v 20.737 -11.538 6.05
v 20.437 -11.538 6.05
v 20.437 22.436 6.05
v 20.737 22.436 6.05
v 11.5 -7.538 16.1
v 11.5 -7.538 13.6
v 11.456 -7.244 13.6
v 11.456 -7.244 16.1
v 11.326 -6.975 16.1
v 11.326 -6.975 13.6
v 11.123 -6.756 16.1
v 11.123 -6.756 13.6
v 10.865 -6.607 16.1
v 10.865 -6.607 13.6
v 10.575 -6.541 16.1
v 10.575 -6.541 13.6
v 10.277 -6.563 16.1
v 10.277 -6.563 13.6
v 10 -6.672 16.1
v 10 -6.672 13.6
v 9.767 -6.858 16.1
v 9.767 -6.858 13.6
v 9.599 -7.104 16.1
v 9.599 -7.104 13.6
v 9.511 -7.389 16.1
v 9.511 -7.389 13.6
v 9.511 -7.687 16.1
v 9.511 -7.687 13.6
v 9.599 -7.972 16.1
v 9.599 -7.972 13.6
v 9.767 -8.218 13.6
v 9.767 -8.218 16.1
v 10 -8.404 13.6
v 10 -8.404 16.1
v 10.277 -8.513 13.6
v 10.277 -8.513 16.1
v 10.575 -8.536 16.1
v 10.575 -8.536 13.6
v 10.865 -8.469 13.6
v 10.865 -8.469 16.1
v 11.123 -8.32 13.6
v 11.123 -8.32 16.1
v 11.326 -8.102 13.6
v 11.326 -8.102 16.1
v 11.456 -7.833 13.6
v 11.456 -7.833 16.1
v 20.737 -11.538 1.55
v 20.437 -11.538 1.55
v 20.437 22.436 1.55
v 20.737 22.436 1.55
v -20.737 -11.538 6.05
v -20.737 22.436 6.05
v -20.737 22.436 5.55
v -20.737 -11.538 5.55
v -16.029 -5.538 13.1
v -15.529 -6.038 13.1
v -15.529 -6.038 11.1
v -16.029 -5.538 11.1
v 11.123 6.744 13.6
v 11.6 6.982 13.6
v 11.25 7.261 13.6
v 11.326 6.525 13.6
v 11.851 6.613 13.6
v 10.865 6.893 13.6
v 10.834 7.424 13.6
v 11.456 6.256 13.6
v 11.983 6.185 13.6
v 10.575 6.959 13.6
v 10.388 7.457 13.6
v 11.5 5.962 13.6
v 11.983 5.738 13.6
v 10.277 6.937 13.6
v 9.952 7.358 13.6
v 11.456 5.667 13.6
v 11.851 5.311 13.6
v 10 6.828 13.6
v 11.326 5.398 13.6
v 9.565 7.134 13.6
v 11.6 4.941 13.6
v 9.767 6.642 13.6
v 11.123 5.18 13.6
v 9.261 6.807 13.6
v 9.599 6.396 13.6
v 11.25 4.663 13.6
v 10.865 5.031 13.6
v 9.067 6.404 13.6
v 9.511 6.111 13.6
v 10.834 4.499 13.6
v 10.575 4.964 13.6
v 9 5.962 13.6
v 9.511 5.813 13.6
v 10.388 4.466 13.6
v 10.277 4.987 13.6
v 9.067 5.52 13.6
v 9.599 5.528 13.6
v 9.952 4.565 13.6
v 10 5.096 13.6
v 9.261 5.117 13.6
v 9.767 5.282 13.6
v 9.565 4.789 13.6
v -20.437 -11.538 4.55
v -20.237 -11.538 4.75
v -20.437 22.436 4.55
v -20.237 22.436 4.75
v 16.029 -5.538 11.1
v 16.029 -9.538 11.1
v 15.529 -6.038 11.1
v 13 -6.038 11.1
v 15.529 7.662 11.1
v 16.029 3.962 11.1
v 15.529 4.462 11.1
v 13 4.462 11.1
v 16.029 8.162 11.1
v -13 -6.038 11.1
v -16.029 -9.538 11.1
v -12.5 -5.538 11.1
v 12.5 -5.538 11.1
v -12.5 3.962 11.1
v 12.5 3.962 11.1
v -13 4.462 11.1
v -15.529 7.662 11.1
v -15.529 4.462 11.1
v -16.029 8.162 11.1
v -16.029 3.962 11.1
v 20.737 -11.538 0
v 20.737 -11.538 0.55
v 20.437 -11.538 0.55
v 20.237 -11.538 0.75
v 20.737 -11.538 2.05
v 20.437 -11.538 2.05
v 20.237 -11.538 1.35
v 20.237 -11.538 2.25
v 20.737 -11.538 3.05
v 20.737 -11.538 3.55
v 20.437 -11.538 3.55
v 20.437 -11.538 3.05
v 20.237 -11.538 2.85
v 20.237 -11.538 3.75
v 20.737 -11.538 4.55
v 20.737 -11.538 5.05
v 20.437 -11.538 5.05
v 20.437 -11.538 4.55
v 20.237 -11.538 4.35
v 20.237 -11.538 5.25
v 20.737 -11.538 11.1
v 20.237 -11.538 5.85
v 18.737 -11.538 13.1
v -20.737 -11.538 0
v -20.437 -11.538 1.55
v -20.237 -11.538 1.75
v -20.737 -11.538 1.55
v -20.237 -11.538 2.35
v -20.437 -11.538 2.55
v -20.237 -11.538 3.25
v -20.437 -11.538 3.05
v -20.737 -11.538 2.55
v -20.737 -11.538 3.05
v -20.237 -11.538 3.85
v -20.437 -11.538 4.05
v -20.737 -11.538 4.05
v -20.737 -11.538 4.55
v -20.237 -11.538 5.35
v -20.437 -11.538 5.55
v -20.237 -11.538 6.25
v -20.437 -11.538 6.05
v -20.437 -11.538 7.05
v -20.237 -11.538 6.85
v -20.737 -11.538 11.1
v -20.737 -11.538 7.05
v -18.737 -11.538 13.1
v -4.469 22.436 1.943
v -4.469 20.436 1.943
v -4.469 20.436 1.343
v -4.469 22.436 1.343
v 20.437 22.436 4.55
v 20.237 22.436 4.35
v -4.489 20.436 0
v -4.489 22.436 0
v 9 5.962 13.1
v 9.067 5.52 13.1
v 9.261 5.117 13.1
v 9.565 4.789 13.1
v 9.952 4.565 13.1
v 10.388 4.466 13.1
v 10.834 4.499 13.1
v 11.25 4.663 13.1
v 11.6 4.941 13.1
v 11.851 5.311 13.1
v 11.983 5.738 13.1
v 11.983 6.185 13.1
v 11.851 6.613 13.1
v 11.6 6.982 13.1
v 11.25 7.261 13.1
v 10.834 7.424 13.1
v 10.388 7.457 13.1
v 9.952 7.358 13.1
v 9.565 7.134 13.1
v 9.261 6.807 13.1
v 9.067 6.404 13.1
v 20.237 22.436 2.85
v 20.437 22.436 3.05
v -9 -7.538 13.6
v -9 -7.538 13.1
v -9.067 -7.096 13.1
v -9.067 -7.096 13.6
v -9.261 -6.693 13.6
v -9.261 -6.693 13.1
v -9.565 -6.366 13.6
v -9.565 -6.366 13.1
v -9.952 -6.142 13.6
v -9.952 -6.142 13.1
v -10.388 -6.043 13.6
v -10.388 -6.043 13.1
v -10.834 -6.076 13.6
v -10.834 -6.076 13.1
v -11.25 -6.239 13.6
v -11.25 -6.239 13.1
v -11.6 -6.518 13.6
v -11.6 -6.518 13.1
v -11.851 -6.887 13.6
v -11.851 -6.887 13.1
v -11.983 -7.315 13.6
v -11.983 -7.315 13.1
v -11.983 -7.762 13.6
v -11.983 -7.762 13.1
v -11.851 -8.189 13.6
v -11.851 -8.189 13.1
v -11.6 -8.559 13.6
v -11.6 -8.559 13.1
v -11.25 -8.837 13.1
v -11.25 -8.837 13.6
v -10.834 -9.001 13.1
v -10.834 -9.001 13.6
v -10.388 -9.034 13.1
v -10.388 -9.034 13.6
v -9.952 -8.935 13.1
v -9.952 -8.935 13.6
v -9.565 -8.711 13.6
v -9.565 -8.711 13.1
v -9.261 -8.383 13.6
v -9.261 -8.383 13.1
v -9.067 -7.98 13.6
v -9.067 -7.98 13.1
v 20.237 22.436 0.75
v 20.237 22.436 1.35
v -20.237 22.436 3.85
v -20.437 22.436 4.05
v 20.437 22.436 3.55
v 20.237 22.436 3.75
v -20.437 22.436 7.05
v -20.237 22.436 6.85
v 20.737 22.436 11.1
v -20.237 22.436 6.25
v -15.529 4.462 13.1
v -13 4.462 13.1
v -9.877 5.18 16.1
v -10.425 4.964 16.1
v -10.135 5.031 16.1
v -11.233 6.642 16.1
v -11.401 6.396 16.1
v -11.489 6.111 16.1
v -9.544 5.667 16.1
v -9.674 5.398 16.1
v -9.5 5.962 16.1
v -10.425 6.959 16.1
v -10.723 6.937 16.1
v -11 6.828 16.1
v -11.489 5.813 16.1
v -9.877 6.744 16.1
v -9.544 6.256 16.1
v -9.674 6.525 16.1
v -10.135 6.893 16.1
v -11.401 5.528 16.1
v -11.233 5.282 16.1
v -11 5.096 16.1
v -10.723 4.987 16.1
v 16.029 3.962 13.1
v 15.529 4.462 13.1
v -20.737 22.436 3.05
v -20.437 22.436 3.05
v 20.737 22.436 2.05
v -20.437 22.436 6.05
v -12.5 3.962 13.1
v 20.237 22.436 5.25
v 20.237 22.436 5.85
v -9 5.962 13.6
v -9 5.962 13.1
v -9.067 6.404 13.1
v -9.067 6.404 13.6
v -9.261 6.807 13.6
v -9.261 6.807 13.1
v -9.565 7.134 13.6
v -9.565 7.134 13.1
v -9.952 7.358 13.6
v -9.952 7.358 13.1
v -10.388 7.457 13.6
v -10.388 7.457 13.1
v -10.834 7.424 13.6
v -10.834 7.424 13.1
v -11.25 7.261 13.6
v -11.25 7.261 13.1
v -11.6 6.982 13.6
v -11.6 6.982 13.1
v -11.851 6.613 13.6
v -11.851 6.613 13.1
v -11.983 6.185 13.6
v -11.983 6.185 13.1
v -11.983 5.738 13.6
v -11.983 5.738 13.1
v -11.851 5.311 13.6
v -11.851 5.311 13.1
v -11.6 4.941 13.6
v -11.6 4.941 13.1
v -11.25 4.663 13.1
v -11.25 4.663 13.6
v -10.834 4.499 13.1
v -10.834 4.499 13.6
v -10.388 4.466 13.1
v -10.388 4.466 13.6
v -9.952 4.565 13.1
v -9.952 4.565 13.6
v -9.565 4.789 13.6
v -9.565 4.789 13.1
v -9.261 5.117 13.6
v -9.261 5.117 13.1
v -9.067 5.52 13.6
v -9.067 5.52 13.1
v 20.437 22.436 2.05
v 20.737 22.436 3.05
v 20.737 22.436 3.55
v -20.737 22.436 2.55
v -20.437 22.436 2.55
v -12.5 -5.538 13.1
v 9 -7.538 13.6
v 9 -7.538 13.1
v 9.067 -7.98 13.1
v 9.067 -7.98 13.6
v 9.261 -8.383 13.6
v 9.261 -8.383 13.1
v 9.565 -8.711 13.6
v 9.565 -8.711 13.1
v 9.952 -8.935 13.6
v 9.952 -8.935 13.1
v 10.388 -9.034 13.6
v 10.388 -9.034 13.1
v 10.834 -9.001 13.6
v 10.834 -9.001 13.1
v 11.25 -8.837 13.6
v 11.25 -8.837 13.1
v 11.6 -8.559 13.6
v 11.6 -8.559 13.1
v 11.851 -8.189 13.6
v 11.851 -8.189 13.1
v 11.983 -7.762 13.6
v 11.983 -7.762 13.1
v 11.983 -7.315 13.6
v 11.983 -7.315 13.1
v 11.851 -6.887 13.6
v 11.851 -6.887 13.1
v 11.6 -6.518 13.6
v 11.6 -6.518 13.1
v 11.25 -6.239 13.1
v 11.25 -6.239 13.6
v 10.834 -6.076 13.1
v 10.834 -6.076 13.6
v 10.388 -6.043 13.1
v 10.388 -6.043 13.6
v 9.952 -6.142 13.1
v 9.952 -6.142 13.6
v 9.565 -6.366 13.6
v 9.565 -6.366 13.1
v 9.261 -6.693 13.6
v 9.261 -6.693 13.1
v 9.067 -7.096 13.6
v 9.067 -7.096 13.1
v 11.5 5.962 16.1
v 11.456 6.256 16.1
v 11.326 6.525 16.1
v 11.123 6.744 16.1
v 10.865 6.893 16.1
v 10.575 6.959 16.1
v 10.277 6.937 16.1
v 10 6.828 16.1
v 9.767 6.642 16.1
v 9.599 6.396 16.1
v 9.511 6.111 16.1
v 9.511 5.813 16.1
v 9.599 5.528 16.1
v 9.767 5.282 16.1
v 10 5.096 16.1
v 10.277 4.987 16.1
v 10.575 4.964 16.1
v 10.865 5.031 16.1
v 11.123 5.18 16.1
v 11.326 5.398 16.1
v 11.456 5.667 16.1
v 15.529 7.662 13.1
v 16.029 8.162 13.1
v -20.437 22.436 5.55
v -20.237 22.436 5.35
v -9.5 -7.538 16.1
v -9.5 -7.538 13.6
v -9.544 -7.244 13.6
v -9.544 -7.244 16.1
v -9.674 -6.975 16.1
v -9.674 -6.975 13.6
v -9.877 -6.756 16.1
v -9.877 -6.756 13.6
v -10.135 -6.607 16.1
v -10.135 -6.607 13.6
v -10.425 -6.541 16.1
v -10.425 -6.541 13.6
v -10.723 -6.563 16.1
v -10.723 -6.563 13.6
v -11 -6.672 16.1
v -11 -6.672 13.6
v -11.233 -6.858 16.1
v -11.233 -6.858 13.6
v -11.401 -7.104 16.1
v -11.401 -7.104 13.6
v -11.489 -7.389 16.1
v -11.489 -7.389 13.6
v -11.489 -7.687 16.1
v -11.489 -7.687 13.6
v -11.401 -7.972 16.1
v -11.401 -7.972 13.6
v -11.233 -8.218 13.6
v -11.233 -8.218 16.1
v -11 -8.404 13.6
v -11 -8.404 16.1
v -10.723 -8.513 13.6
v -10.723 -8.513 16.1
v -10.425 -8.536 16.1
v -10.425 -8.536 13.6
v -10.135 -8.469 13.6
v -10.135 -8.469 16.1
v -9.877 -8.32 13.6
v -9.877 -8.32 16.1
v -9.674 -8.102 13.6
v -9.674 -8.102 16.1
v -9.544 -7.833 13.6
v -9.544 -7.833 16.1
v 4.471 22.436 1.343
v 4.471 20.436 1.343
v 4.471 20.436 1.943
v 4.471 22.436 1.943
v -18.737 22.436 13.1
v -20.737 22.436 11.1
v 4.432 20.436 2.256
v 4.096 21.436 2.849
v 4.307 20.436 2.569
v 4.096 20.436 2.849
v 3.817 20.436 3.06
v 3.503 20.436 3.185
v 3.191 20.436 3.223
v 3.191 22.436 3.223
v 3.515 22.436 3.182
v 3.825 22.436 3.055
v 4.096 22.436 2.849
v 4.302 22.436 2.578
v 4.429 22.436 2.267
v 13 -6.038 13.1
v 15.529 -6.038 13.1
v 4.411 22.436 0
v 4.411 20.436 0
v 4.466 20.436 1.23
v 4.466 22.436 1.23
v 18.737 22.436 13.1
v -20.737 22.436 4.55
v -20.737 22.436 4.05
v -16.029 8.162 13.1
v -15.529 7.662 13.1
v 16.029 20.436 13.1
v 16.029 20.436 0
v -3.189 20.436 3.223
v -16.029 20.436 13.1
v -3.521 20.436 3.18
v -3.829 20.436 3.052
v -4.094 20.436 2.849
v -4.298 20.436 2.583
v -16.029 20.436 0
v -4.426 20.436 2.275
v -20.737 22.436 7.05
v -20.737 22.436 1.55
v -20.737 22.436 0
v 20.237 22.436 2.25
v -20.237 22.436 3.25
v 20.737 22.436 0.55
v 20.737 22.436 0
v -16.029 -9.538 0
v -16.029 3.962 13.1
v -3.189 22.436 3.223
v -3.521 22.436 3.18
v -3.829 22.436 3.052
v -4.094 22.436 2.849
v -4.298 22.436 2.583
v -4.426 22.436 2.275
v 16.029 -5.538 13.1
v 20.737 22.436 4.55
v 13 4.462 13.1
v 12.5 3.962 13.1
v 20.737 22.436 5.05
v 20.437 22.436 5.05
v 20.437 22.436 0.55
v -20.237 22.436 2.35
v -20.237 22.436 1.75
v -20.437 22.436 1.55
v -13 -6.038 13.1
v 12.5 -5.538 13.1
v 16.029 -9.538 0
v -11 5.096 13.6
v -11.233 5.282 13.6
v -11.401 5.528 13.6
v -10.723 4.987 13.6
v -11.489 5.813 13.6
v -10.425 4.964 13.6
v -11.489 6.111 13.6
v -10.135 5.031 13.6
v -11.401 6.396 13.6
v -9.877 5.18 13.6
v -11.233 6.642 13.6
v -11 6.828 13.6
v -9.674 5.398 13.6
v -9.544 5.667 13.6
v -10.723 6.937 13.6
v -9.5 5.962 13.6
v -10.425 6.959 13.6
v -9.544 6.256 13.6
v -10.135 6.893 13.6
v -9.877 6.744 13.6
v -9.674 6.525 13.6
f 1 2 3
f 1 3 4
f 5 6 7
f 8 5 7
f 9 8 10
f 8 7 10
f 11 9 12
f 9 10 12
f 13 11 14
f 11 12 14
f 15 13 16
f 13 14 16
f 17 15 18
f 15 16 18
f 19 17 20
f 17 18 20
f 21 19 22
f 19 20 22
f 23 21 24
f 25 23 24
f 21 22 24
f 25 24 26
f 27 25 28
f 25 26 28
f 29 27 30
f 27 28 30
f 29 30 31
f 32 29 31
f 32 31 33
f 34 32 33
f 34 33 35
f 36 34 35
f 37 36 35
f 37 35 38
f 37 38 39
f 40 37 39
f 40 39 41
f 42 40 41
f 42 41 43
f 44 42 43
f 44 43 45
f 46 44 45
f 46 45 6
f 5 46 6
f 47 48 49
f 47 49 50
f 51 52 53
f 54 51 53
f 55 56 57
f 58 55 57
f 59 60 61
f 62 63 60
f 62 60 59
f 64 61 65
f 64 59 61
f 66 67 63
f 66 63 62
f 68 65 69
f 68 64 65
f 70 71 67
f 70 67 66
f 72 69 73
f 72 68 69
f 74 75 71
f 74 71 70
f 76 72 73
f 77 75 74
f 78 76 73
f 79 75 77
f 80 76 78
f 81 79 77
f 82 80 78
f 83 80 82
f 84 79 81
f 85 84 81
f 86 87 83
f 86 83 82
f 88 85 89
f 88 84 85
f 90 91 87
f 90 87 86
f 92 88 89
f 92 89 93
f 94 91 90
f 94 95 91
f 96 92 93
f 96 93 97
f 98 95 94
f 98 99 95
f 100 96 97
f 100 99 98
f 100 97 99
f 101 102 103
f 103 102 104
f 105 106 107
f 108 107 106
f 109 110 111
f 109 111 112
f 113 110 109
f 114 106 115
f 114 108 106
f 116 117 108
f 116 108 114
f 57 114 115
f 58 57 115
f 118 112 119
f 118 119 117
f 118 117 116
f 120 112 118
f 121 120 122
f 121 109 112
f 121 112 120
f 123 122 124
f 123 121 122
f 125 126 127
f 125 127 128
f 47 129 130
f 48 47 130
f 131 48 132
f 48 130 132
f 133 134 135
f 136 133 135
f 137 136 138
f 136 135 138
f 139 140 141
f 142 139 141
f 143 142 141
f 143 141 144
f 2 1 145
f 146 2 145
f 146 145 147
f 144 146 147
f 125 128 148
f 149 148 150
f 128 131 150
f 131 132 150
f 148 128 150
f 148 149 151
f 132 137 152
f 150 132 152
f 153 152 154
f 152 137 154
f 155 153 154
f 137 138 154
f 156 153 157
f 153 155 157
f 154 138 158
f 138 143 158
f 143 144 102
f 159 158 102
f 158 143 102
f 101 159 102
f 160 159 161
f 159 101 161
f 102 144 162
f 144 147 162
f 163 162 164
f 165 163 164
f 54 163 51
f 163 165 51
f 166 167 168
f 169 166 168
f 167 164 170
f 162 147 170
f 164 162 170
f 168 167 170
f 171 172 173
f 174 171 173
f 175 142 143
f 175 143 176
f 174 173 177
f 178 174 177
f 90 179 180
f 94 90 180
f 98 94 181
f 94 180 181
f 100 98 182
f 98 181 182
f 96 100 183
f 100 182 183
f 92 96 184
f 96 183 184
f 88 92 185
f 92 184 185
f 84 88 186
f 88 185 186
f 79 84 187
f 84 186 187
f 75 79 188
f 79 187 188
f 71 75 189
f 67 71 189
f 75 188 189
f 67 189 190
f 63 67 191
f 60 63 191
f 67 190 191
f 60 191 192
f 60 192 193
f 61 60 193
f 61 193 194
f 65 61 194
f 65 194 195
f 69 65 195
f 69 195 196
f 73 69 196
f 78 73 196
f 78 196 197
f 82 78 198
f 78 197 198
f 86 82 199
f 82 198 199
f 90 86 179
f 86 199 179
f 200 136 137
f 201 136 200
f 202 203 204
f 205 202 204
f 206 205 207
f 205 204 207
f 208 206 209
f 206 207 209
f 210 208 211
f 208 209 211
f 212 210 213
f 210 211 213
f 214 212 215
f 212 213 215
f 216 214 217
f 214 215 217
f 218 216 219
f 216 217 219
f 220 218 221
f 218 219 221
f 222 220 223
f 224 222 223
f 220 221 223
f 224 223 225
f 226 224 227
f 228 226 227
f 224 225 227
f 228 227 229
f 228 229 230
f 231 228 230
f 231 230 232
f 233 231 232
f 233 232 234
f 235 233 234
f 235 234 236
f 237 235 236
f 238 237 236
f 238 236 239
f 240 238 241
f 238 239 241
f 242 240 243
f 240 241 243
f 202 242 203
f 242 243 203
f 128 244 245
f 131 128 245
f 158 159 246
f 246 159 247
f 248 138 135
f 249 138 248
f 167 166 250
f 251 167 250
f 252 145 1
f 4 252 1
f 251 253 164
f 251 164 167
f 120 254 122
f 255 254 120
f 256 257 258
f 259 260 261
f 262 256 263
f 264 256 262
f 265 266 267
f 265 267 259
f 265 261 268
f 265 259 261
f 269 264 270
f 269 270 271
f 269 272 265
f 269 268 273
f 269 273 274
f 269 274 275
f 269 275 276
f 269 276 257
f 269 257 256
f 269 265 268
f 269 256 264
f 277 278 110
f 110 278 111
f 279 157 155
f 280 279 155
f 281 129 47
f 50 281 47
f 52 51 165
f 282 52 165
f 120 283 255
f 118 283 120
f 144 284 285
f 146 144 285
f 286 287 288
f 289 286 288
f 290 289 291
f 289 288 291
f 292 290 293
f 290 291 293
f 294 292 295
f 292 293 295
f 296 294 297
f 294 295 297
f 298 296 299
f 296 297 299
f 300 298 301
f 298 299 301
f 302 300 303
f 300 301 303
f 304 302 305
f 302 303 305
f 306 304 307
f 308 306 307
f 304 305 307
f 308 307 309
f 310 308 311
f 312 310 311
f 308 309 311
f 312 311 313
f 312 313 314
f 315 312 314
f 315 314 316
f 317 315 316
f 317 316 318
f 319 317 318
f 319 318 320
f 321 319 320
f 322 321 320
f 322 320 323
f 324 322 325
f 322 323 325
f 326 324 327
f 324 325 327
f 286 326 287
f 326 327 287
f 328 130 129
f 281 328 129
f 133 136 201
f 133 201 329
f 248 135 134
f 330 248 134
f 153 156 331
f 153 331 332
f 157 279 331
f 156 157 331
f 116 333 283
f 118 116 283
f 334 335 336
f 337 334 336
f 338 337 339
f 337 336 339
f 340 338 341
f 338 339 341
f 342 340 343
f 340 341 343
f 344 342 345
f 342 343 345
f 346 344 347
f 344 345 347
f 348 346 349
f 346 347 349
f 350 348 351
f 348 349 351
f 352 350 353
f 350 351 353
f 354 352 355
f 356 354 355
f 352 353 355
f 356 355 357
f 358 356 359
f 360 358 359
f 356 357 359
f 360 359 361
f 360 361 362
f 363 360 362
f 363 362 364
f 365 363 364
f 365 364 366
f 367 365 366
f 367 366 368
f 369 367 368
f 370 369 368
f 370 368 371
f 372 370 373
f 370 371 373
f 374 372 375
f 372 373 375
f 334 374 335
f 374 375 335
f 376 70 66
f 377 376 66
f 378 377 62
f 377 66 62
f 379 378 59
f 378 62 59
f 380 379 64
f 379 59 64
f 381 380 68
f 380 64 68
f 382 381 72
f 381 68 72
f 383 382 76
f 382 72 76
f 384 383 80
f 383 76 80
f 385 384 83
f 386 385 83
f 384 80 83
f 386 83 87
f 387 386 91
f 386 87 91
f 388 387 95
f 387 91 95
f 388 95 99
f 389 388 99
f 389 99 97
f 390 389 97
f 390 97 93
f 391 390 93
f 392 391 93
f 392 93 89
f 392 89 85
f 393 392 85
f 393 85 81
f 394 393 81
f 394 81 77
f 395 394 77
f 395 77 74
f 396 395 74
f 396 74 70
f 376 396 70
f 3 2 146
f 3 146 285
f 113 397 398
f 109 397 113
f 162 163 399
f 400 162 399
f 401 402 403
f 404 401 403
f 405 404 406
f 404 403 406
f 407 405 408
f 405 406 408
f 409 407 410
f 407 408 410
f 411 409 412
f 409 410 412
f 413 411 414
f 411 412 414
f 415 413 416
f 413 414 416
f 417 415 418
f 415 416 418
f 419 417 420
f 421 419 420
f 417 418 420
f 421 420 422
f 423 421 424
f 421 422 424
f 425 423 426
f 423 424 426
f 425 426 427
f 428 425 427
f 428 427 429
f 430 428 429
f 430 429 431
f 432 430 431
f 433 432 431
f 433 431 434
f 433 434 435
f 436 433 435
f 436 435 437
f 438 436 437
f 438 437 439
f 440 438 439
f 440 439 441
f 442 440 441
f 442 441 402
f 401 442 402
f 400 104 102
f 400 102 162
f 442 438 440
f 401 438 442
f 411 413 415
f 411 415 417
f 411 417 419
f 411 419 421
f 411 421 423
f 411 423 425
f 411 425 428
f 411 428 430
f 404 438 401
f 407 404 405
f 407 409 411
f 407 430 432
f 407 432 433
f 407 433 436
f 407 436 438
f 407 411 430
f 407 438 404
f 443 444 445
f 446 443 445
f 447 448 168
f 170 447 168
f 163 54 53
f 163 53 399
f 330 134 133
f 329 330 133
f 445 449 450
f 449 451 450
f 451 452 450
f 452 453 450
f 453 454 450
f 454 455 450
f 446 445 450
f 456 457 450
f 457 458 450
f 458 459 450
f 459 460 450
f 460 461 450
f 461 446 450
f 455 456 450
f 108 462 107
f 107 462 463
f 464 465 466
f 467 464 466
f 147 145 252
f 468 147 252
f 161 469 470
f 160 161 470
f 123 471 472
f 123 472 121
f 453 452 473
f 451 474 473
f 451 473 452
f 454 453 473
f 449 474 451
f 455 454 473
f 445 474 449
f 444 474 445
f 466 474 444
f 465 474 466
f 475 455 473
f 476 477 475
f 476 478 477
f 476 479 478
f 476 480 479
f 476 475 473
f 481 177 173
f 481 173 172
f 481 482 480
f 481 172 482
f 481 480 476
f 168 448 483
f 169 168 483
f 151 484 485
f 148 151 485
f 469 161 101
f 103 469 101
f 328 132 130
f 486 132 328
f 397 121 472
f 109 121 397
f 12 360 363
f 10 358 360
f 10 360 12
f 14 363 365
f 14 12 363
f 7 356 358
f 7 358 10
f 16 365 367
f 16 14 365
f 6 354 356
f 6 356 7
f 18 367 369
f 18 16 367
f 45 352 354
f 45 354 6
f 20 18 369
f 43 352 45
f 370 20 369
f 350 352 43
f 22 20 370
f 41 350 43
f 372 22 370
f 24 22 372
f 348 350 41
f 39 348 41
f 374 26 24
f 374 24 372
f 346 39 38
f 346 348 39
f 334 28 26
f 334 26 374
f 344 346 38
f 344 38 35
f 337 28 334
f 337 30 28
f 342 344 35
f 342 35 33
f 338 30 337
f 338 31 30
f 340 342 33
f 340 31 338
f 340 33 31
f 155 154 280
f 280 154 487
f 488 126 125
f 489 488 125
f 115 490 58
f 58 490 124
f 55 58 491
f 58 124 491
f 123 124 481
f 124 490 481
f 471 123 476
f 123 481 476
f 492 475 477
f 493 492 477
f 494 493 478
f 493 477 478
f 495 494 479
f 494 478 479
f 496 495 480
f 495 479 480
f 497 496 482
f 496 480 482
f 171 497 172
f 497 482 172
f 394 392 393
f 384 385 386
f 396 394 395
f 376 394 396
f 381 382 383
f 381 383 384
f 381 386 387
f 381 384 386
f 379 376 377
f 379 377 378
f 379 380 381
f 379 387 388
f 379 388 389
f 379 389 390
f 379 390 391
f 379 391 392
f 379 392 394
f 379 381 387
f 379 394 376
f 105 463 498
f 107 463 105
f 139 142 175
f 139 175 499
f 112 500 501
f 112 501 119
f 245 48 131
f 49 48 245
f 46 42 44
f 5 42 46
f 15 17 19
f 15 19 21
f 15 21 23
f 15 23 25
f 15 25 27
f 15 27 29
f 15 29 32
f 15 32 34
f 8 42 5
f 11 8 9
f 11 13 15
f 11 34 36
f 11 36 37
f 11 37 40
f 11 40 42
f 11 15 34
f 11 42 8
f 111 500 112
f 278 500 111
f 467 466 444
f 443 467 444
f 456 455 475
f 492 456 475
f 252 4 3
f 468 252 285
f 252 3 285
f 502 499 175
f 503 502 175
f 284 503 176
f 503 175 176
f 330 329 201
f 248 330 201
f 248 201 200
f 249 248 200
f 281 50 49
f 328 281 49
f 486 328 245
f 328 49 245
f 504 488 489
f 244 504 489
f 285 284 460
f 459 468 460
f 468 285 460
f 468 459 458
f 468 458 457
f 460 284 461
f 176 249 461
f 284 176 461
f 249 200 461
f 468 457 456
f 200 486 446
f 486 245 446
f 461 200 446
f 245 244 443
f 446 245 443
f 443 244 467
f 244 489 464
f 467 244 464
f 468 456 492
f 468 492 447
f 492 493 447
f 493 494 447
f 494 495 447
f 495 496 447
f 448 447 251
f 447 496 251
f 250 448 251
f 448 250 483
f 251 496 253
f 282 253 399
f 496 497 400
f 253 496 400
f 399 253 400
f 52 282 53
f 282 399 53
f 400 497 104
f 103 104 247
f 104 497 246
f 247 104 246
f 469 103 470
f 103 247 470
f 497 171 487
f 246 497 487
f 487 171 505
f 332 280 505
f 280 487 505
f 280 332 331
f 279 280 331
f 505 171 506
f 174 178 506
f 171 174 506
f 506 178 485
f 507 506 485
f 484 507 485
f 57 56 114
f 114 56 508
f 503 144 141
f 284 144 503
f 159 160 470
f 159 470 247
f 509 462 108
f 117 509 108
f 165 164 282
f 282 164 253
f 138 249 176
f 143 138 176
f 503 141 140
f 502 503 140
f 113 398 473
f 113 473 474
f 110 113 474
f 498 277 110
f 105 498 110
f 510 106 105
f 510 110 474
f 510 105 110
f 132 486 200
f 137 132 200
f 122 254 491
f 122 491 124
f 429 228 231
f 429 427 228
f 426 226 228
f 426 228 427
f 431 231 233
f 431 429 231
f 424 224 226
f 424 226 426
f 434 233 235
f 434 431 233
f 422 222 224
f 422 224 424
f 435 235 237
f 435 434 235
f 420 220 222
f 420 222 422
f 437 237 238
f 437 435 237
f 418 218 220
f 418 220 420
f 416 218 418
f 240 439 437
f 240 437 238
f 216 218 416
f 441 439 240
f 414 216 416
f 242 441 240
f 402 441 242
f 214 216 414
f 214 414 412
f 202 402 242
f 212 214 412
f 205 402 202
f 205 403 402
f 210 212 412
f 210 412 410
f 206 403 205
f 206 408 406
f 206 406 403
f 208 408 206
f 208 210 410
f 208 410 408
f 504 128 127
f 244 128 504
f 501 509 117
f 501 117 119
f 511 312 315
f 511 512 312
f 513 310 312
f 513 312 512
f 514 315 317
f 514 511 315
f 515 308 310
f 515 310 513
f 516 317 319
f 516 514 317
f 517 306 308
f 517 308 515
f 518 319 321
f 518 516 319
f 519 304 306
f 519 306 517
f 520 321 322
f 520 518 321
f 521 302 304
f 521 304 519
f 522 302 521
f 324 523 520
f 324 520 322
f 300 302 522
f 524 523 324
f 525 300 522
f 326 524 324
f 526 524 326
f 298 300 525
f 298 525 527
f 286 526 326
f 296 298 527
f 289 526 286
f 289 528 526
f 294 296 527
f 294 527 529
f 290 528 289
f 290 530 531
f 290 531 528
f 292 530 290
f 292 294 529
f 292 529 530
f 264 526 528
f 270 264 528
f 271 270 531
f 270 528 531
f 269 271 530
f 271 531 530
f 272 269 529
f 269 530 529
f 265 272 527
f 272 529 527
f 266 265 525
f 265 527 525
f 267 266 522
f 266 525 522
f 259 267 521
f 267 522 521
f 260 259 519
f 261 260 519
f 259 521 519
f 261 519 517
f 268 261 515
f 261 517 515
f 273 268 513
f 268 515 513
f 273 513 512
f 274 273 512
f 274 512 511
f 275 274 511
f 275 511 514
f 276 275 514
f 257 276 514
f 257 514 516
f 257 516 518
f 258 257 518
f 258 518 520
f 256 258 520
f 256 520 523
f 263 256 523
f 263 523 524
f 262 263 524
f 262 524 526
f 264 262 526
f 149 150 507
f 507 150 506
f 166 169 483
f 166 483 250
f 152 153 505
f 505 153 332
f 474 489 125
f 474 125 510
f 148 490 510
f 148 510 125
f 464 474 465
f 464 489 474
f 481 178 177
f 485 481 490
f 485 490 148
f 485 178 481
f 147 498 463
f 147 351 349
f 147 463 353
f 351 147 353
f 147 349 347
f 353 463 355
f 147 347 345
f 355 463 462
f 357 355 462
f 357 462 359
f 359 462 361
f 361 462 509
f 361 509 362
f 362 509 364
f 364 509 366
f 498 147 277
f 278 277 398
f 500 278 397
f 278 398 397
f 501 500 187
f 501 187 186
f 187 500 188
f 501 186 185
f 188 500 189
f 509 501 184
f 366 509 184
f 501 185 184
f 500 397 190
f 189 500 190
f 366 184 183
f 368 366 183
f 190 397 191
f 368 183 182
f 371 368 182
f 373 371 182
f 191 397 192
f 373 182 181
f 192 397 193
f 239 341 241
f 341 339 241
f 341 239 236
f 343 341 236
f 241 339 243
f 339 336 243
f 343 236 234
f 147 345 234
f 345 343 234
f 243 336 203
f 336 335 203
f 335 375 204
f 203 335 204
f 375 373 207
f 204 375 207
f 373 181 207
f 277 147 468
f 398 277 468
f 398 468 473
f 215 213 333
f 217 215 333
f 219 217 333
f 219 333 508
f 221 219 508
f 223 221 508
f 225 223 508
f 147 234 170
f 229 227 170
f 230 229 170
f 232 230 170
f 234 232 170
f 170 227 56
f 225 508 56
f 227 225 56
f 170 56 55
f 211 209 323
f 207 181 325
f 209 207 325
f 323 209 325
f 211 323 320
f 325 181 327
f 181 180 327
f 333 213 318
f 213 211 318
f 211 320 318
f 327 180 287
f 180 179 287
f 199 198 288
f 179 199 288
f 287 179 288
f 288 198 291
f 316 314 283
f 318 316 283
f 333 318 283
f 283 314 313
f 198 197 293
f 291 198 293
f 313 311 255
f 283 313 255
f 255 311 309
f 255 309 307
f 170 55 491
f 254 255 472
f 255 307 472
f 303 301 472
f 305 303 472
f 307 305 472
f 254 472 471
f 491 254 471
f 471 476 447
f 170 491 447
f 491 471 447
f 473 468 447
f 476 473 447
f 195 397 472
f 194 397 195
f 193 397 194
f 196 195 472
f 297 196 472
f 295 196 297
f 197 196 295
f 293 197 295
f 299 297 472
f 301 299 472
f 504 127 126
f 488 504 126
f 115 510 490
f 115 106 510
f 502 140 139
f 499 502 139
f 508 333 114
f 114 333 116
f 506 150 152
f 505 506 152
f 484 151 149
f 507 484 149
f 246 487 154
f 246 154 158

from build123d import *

# Parameters (mm, degrees)
SKETCH_1_W          = 4.708553468
SKETCH_1_H          = 29.97466091
EXTRUDE_1_DEPTH     = 4.1
EXTRUDE_1_2_DEPTH   = 4.1
SKETCH_2_W          = 4.708553468
SKETCH_2_H          = 29.97466091
EXTRUDE_2_DEPTH     = 9
SKETCH_3_W          = 6
SKETCH_3_H          = 29.97466091
EXTRUDE_3_DEPTH     = 32.057569214
SKETCH_6_R          = 1
EXTRUDE_4_DEPTH     = 3
SKETCH_7_R          = 1.5
EXTRUDE_5_DEPTH     = 0.5
CUT_EXTRUDE_1_REACH = 33.926
SKETCH_9_W          = 32.057569214
SKETCH_9_H          = 5.97466091
EXTRUDE_6_DEPTH     = 2
SKETCH_12_W         = 4.708553468
SKETCH_12_H         = 13.1
EXTRUDE_7_DEPTH     = 2
SKETCH_13_W         = 32.057569214
SKETCH_13_H         = 6
CUT_EXTRUDE_3_DEPTH = 6.8
CUT_EXTRUDE_4_REACH = 35.242
SKETCH_14_W         = 3.528784607
SKETCH_14_H         = 10.5
CHAMFER_1_SIZE      = 2
CHAMFER_2_SIZE      = 0.5
CUT_EXTRUDE_5_REACH = 44.936
SKETCH_15_W         = 0.5
SKETCH_15_H         = 1
CHAMFER_3_SIZE      = 0.2
CHAMFER_4_SIZE      = 0.2
SKETCH_16_W         = 32.057569214
SKETCH_16_H         = 2
EXTRUDE_8_DEPTH     = 13.1
CUT_EXTRUDE_7_REACH = 43.372
SKETCH_18_W         = 32.057569214
SKETCH_18_H         = 2
EXTRUDE_9_DEPTH     = 7.1
CUT_EXTRUDE_8_DEPTH = 4


with BuildPart() as part:
    # 草图1 → 凸台-拉伸1 (new body)
    with BuildSketch(Plane.XY):
        with Locations((-18.383061341, 5.449009398)):
            Rectangle(SKETCH_1_W, SKETCH_1_H)
    extrude(amount=EXTRUDE_1_DEPTH)



with BuildPart() as body_2:
    # 草图1 → Extrude 1 2 (new body)
    with BuildSketch(Plane.XY):
        with Locations((18.383061341, 5.449009398)):
            Rectangle(SKETCH_1_W, SKETCH_1_H)
    extrude(amount=EXTRUDE_1_2_DEPTH)


with BuildPart() as part_1:
    add(part.part)

    add(body_2.part)  # 凸台-拉伸2 merges body 2
    # 草图2 → 凸台-拉伸2 (add)
    with BuildSketch(Plane.XY.offset(4.1)):
        with Locations((-18.383061341, 5.449009398)):
            Rectangle(SKETCH_2_W, SKETCH_2_H)
        with Locations((18.383061341, 5.449009398)):
            Rectangle(SKETCH_2_W, SKETCH_2_H)
    extrude(amount=EXTRUDE_2_DEPTH)

    # 草图3 → 凸台-拉伸3 (add)
    with BuildSketch(Plane.ZY.offset(-16.028784607)):
        with Locations((10.1, 5.449009398)):
            Rectangle(SKETCH_3_W, SKETCH_3_H)
    extrude(amount=EXTRUDE_3_DEPTH)

    # 草图6 → 凸台-拉伸4 (add)
    with BuildSketch(Plane.XY.offset(13.1)):
        with Locations((-10.5, 5.961678943)):
            Circle(SKETCH_6_R)
        with Locations((10.5, -7.538321057)):
            Circle(SKETCH_6_R)
        with Locations((-10.5, -7.538321057)):
            Circle(SKETCH_6_R)
        with Locations((10.5, 5.961678943)):
            Circle(SKETCH_6_R)
    extrude(amount=EXTRUDE_4_DEPTH)

    # 草图7 → 凸台-拉伸5 (add)
    with BuildSketch(Plane.XY.offset(13.1)):
        with Locations((-10.5, 5.961678943)):
            Circle(SKETCH_7_R)
        with Locations((-10.5, -7.538321057)):
            Circle(SKETCH_7_R)
        with Locations(Location((10.5, -7.538321057, 0), (0, 0, 180))):
            Circle(SKETCH_7_R)
        with Locations(Location((10.5, 5.961678943, 0), (0, 0, 180))):
            Circle(SKETCH_7_R)
    extrude(amount=EXTRUDE_5_DEPTH)

    # 草图9 → 切除-拉伸1 (cut, up to next)
    with BuildSketch(Plane.XY.offset(13.1), mode=Mode.PRIVATE) as cut_extrude_1_sk1:
        with Locations((0, 17.449009398)):
            Rectangle(SKETCH_9_W, SKETCH_9_H)
    cut_extrude_1_tool1 = extrude(cut_extrude_1_sk1.sketch, amount=-CUT_EXTRUDE_1_REACH, mode=Mode.PRIVATE) & part_1.part
    add(cut_extrude_1_tool1.solids().sort_by_distance((0, 17.449009, 13.1))[0], mode=Mode.SUBTRACT)

    # 草图11 → 凸台-拉伸6 (add)
    with BuildSketch(Plane.XZ.offset(9.538321057)):
        Polygon((-20.737338075, 0), (-16.028784607, 0), (-16.028784607, 7.1), (16.028784607, 7.1), (16.028784607, 0), (20.737338075, 0), (20.737338075, 13.1), (-20.737338075, 13.1), align=None)
    extrude(amount=EXTRUDE_6_DEPTH)

    # 草图12 → 凸台-拉伸7 (add)
    with BuildSketch(Plane(origin=(0, 20.436339853, 0), x_dir=(1, 0, 0), z_dir=(0, 1, 0))):
        with Locations((18.383061341, -6.55)):
            Rectangle(SKETCH_12_W, SKETCH_12_H)
        with Locations((-18.383061341, -6.55)):
            Rectangle(SKETCH_12_W, SKETCH_12_H)
    extrude(amount=EXTRUDE_7_DEPTH)

    # 草图13 → 切除-拉伸3 (cut)
    with BuildSketch(Plane(origin=(0, 14.461678943, 0), x_dir=(1, 0, 0), z_dir=(0, 1, 0))):
        with Locations((0, -10.1)):
            Rectangle(SKETCH_13_W, SKETCH_13_H)
    extrude(amount=-CUT_EXTRUDE_3_DEPTH, mode=Mode.SUBTRACT)

    # 草图14 → 切除-拉伸4 (cut, up to next)
    with BuildSketch(Plane.XY.offset(13.1), mode=Mode.PRIVATE) as cut_extrude_4_sk1:
        with Locations((-14.264392304, -0.788321057)):
            Rectangle(SKETCH_14_W, SKETCH_14_H)
    cut_extrude_4_tool1 = extrude(cut_extrude_4_sk1.sketch, amount=-CUT_EXTRUDE_4_REACH, mode=Mode.PRIVATE) & part_1.part
    # 草图14 → 切除-拉伸4 (cut, up to next)
    with BuildSketch(Plane.XY.offset(13.1), mode=Mode.PRIVATE) as cut_extrude_4_sk2:
        with Locations((14.264392304, -0.788321057)):
            Rectangle(SKETCH_14_W, SKETCH_14_H)
    cut_extrude_4_tool2 = extrude(cut_extrude_4_sk2.sketch, amount=-CUT_EXTRUDE_4_REACH, mode=Mode.PRIVATE) & part_1.part
    add(cut_extrude_4_tool1.solids().sort_by_distance((-14.264392, -0.788321, 13.1))[0], mode=Mode.SUBTRACT)
    add(cut_extrude_4_tool2.solids().sort_by_distance((14.264392, -0.788321, 13.1))[0], mode=Mode.SUBTRACT)

    # 倒角1
    chamfer_1_edges = [part_1.edges().sort_by_distance(p)[0] for p in [
        (-20.737338075, 5.449009398, 13.1),
        (20.737338075, 5.449009398, 13.1),
    ]]
    chamfer(chamfer_1_edges, length=CHAMFER_1_SIZE)

    # 倒角2
    chamfer_2_edges = [part_1.edges().sort_by_distance(p)[0] for p in [
        (16.028784607, 7.661678943, 10.1),
        (-16.028784607, 7.661678943, 10.1),
        (-16.028784607, -6.038321057, 10.1),
        (-12.5, 4.461678943, 10.1),
        (-12.5, -6.038321057, 10.1),
        (-16.028784607, 4.461678943, 10.1),
        (16.028784607, 4.461678943, 10.1),
        (12.5, 4.461678943, 10.1),
        (16.028784607, -6.038321057, 10.1),
        (12.5, -6.038321057, 10.1),
    ]]
    chamfer(chamfer_2_edges, length=CHAMFER_2_SIZE)

    # 草图15 → 切除-拉伸5 (cut, up to next)
    with BuildSketch(Plane.XZ.offset(11.538321057), mode=Mode.PRIVATE) as cut_extrude_5_sk1:
        with Locations((-20.487338075, 5.05)):
            Rectangle(SKETCH_15_W, SKETCH_15_H)
    cut_extrude_5_tool1 = extrude(cut_extrude_5_sk1.sketch, amount=-CUT_EXTRUDE_5_REACH, mode=Mode.PRIVATE) & part_1.part
    # 草图15 → 切除-拉伸5 (cut, up to next)
    with BuildSketch(Plane.XZ.offset(11.538321057), mode=Mode.PRIVATE) as cut_extrude_5_sk2:
        with Locations((-20.487338075, 3.55)):
            Rectangle(SKETCH_15_W, SKETCH_15_H)
    cut_extrude_5_tool2 = extrude(cut_extrude_5_sk2.sketch, amount=-CUT_EXTRUDE_5_REACH, mode=Mode.PRIVATE) & part_1.part
    # 草图15 → 切除-拉伸5 (cut, up to next)
    with BuildSketch(Plane.XZ.offset(11.538321057), mode=Mode.PRIVATE) as cut_extrude_5_sk3:
        with Locations((-20.487338075, 2.05)):
            Rectangle(SKETCH_15_W, SKETCH_15_H)
    cut_extrude_5_tool3 = extrude(cut_extrude_5_sk3.sketch, amount=-CUT_EXTRUDE_5_REACH, mode=Mode.PRIVATE) & part_1.part
    # 草图15 → 切除-拉伸5 (cut, up to next)
    with BuildSketch(Plane.XZ.offset(11.538321057), mode=Mode.PRIVATE) as cut_extrude_5_sk4:
        with Locations((-20.487338075, 6.55)):
            Rectangle(SKETCH_15_W, SKETCH_15_H)
    cut_extrude_5_tool4 = extrude(cut_extrude_5_sk4.sketch, amount=-CUT_EXTRUDE_5_REACH, mode=Mode.PRIVATE) & part_1.part
    # 草图15 → 切除-拉伸5 (cut, up to next)
    with BuildSketch(Plane.XZ.offset(11.538321057), mode=Mode.PRIVATE) as cut_extrude_5_sk5:
        with Locations((20.487338075, 5.55)):
            Rectangle(SKETCH_15_W, SKETCH_15_H)
    cut_extrude_5_tool5 = extrude(cut_extrude_5_sk5.sketch, amount=-CUT_EXTRUDE_5_REACH, mode=Mode.PRIVATE) & part_1.part
    # 草图15 → 切除-拉伸5 (cut, up to next)
    with BuildSketch(Plane.XZ.offset(11.538321057), mode=Mode.PRIVATE) as cut_extrude_5_sk6:
        with Locations((20.487338075, 1.05)):
            Rectangle(SKETCH_15_W, SKETCH_15_H)
    cut_extrude_5_tool6 = extrude(cut_extrude_5_sk6.sketch, amount=-CUT_EXTRUDE_5_REACH, mode=Mode.PRIVATE) & part_1.part
    # 草图15 → 切除-拉伸5 (cut, up to next)
    with BuildSketch(Plane.XZ.offset(11.538321057), mode=Mode.PRIVATE) as cut_extrude_5_sk7:
        with Locations((20.487338075, 2.55)):
            Rectangle(SKETCH_15_W, SKETCH_15_H)
    cut_extrude_5_tool7 = extrude(cut_extrude_5_sk7.sketch, amount=-CUT_EXTRUDE_5_REACH, mode=Mode.PRIVATE) & part_1.part
    # 草图15 → 切除-拉伸5 (cut, up to next)
    with BuildSketch(Plane.XZ.offset(11.538321057), mode=Mode.PRIVATE) as cut_extrude_5_sk8:
        with Locations((20.487338075, 4.05)):
            Rectangle(SKETCH_15_W, SKETCH_15_H)
    cut_extrude_5_tool8 = extrude(cut_extrude_5_sk8.sketch, amount=-CUT_EXTRUDE_5_REACH, mode=Mode.PRIVATE) & part_1.part
    add(cut_extrude_5_tool1.solids().sort_by_distance((-20.487338, -11.538321, 5.05))[0], mode=Mode.SUBTRACT)
    add(cut_extrude_5_tool2.solids().sort_by_distance((-20.487338, -11.538321, 3.55))[0], mode=Mode.SUBTRACT)
    add(cut_extrude_5_tool3.solids().sort_by_distance((-20.487338, -11.538321, 2.05))[0], mode=Mode.SUBTRACT)
    add(cut_extrude_5_tool4.solids().sort_by_distance((-20.487338, -11.538321, 6.55))[0], mode=Mode.SUBTRACT)
    add(cut_extrude_5_tool5.solids().sort_by_distance((20.487338, -11.538321, 5.55))[0], mode=Mode.SUBTRACT)
    add(cut_extrude_5_tool6.solids().sort_by_distance((20.487338, -11.538321, 1.05))[0], mode=Mode.SUBTRACT)
    add(cut_extrude_5_tool7.solids().sort_by_distance((20.487338, -11.538321, 2.55))[0], mode=Mode.SUBTRACT)
    add(cut_extrude_5_tool8.solids().sort_by_distance((20.487338, -11.538321, 4.05))[0], mode=Mode.SUBTRACT)

    # 倒角3
    chamfer_3_edges = [part_1.edges().sort_by_distance(p)[0] for p in [
        (-20.237338075, 5.449009398, 4.05),
        (-20.237338075, 5.449009398, 3.05),
        (-20.237338075, 5.449009398, 2.55),
        (-20.237338075, 5.449009398, 1.55),
        (-20.237338075, 5.449009398, 7.05),
        (-20.237338075, 5.449009398, 6.05),
        (-20.237338075, 5.449009398, 5.55),
        (-20.237338075, 5.449009398, 4.55),
    ]]
    chamfer(chamfer_3_edges, length=CHAMFER_3_SIZE)

    # 倒角4
    chamfer_4_edges = [part_1.edges().sort_by_distance(p)[0] for p in [
        (20.237338075, 5.449009398, 6.05),
        (20.237338075, 5.449009398, 5.05),
        (20.237338075, 5.449009398, 1.55),
        (20.237338075, 5.449009398, 0.55),
        (20.237338075, 5.449009398, 3.05),
        (20.237338075, 5.449009398, 2.05),
        (20.237338075, 5.449009398, 4.55),
        (20.237338075, 5.449009398, 3.55),
    ]]
    chamfer(chamfer_4_edges, length=CHAMFER_4_SIZE)

    # 草图16 → 凸台-拉伸8 (add)
    with BuildSketch(Plane(origin=(0, 0, 0), x_dir=(-1, 0, 0), z_dir=(0, 0, -1))):
        with Locations((0, 21.436339853)):
            Rectangle(SKETCH_16_W, SKETCH_16_H)
    extrude(amount=-EXTRUDE_8_DEPTH)

    # 草图17 → 切除-拉伸7 (cut, up to next)
    with BuildSketch(Plane.XZ.offset(-20.436339853), mode=Mode.PRIVATE) as cut_extrude_7_sk1:
        with BuildLine():
            Line((4.465561881, 1.229756424), (4.470622966, 1.343469934))
            Line((4.470622966, 1.343469934), (4.470622966, 1.943469934))
            add(Edge.make_bspline(
                [(4.470622966, 1.943469934), (4.470622966, 3.223469934), (3.190622966, 3.223469934)],
                knots=[1.814608209, 1.814608209, 1.814608209, 3.385404536, 3.385404536, 3.385404536], degree=2, weights=[1, 0.707106781, 1]))
            Line((3.190622966, 3.223469934), (-3.189377034, 3.223469934))
            ThreePointArc((-3.189377034, 3.223469934), (-4.094473714, 2.848566614), (-4.469377034, 1.943469934))
            Line((-4.469377034, 1.943469934), (-4.469377034, 1.343469934))
            Line((-4.469377034, 1.343469934), (-4.489171494, 5.5e-08))
            Line((-4.489171494, 5.5e-08), (4.410828707, 4e-09))
            Line((4.410828707, 4e-09), (4.465561881, 1.229756424))
        make_face()
    cut_extrude_7_tool1 = extrude(cut_extrude_7_sk1.sketch, amount=-CUT_EXTRUDE_7_REACH, mode=Mode.PRIVATE) & part_1.part
    add(cut_extrude_7_tool1.solids().sort_by_distance((-0.00786, 20.43634, 1.579655))[0], mode=Mode.SUBTRACT)

    # 草图18 → 凸台-拉伸9 (add)
    with BuildSketch(Plane(origin=(0, 0, 7.1), x_dir=(-1, 0, 0), z_dir=(0, 0, -1))):
        with Locations((0, -10.538321057)):
            Rectangle(SKETCH_18_W, SKETCH_18_H)
    extrude(amount=EXTRUDE_9_DEPTH)

    # 草图19 → 切除-拉伸8 (cut)
    with BuildSketch(Plane(origin=(0, 0, 7.1), x_dir=(-1, 0, 0), z_dir=(0, 0, -1))):
        Polygon((-16.028784607, -5.538321057), (-16.028784607, -9.538321057), (16.028784607, -9.538321057), (16.028784607, -5.538321057), (15.528784607, -6.038321057), (13, -6.038321057), (12.5, -5.538321057), (12.5, 3.961678943), (13, 4.461678943), (15.528784607, 4.461678943), (16.028784607, 3.961678943), (16.028784607, 8.161678943), (15.528784607, 7.661678943), (-15.528784607, 7.661678943), (-16.028784607, 8.161678943), (-16.028784607, 3.961678943), (-15.528784607, 4.461678943), (-13, 4.461678943), (-12.5, 3.961678943), (-12.5, -5.538321057), (-13, -6.038321057), (-15.528784607, -6.038321057), align=None)
    extrude(amount=-CUT_EXTRUDE_8_DEPTH, mode=Mode.SUBTRACT)


solid = part_1.part
